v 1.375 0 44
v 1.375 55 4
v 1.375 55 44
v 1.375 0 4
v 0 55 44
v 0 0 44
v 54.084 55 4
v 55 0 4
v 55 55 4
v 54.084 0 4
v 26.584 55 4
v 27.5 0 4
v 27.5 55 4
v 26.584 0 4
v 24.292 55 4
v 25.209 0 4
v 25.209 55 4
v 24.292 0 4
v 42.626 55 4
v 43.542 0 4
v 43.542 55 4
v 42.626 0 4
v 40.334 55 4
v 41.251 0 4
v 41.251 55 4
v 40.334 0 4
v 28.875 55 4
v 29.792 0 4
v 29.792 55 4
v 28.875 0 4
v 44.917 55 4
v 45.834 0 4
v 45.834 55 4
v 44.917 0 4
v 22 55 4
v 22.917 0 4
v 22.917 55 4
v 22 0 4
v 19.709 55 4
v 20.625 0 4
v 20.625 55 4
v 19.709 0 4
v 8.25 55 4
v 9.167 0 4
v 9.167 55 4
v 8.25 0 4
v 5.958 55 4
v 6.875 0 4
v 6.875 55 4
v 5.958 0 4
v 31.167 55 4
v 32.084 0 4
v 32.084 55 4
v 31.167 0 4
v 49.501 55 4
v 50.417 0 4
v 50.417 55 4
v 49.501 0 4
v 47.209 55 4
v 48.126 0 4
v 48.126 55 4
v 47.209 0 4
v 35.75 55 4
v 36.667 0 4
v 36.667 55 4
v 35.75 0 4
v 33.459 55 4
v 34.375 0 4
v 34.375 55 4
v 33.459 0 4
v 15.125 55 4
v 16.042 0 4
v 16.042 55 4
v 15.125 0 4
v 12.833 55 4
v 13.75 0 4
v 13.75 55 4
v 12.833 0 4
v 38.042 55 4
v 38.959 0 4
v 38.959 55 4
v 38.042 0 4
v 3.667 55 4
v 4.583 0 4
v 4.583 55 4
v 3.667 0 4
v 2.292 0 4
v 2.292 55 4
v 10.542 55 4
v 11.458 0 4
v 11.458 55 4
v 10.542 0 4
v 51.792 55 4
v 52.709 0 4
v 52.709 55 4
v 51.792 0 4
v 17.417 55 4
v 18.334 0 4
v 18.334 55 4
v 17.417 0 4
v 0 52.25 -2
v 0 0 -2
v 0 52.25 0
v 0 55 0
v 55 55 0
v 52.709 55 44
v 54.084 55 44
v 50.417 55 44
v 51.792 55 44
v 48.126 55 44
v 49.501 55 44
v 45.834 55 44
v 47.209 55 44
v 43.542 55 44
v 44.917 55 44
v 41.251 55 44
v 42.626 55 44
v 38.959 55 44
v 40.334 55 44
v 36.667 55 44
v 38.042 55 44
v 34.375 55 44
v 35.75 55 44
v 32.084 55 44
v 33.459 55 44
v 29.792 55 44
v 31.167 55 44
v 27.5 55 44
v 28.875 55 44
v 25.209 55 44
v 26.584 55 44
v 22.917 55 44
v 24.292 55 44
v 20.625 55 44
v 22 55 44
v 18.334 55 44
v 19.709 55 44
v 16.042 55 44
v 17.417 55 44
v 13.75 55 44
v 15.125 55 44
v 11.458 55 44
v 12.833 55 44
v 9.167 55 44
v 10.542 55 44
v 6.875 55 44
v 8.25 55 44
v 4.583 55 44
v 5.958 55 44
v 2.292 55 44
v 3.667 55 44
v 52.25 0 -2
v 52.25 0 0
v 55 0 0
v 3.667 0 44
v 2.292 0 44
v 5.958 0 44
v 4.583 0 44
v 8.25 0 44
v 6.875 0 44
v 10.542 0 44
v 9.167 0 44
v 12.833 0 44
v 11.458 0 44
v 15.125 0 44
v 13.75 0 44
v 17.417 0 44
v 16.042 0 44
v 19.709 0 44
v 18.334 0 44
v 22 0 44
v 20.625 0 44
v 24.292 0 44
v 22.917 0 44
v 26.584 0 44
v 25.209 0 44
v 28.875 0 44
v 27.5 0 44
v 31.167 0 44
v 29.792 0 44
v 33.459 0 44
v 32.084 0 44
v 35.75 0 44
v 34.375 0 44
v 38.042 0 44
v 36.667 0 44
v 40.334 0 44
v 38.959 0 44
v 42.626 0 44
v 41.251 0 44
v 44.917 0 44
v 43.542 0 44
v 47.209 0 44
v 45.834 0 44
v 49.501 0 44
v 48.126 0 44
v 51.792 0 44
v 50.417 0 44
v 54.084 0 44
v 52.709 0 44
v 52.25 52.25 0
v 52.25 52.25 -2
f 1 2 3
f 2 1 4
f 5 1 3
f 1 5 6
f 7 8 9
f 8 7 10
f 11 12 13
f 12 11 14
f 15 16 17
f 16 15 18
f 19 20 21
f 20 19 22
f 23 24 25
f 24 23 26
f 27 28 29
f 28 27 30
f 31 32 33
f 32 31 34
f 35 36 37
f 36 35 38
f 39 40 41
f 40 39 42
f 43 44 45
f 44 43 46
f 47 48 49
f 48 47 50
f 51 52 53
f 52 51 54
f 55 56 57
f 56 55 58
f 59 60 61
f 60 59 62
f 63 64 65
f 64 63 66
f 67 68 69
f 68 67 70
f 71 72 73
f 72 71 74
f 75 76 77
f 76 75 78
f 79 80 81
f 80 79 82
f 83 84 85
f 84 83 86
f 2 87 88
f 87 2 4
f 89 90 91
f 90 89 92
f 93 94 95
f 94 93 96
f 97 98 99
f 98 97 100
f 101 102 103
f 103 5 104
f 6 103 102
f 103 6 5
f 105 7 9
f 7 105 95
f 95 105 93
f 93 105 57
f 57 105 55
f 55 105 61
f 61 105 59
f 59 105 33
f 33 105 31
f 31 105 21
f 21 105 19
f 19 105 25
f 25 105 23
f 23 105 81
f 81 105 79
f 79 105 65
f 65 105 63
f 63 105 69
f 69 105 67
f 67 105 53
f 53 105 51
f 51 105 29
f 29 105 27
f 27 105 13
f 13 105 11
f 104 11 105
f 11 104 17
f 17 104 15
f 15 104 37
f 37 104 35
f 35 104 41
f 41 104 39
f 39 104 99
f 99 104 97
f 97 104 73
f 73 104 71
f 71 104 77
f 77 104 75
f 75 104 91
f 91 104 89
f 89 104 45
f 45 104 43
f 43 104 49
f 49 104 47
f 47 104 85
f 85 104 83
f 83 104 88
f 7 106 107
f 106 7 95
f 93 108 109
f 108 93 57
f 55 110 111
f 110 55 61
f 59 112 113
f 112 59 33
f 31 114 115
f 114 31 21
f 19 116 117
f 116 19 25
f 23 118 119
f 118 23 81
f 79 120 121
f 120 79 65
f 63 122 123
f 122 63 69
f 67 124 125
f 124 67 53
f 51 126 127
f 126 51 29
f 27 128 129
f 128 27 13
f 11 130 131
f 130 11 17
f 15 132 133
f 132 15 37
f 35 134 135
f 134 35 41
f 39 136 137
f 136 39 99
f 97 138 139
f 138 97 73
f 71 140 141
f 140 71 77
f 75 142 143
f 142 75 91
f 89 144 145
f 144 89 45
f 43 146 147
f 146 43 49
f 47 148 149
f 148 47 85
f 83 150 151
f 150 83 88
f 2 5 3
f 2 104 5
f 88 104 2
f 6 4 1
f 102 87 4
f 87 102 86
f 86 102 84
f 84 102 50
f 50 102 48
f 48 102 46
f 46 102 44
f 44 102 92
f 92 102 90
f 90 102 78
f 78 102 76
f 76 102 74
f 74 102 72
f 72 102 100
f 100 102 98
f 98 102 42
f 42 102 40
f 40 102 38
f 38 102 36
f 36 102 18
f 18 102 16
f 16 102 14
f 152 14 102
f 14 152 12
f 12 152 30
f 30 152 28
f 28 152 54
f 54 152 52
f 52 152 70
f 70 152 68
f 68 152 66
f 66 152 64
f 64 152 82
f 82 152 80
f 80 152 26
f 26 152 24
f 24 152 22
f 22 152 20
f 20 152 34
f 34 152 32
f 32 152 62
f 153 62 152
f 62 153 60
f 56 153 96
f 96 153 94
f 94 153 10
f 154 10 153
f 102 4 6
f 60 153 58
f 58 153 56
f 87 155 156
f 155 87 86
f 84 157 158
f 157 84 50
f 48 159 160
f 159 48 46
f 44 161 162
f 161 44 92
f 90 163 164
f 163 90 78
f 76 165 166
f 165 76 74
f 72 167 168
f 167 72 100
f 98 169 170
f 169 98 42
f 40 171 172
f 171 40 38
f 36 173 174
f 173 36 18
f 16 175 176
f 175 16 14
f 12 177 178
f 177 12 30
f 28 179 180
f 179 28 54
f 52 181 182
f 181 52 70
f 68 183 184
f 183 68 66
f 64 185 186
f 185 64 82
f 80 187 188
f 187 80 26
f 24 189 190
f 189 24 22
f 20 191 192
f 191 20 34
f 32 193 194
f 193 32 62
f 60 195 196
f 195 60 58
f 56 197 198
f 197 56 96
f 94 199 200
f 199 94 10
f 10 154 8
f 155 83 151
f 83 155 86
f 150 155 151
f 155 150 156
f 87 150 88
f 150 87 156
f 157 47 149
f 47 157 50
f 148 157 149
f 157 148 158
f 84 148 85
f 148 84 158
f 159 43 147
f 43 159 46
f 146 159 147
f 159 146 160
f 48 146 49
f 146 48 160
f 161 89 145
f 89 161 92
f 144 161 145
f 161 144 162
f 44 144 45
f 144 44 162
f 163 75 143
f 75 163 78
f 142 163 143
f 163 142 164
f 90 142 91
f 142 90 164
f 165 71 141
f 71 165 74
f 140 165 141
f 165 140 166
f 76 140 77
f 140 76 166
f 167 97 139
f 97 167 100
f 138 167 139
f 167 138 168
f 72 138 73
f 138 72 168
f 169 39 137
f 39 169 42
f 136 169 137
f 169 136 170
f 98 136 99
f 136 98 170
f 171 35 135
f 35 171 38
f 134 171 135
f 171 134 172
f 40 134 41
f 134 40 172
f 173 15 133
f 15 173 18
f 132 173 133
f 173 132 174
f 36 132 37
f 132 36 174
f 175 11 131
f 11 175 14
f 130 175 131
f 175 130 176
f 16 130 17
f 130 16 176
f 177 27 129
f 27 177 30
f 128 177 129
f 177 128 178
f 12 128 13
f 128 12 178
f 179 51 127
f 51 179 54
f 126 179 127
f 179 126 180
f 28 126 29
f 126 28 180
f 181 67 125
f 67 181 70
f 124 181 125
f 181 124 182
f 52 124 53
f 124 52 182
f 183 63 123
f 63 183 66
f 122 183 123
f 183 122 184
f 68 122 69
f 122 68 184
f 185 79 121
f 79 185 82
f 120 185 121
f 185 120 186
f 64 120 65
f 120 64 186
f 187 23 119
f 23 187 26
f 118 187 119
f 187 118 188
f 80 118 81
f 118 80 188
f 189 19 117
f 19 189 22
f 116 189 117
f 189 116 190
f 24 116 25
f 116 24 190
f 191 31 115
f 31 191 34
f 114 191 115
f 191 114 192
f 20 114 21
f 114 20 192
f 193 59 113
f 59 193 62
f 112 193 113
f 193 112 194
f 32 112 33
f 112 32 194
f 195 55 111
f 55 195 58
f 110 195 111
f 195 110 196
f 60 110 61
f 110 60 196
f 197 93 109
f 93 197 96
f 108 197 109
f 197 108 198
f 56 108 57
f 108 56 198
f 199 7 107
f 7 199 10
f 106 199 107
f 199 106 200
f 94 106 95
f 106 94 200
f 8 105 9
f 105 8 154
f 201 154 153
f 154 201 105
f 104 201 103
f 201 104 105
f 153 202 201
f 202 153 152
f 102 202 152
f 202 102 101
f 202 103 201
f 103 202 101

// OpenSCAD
// Generated by Text-to-CAD from prompt:
// a GPU heatsink with 24 fins
$fn = 64;

module GPUHeatsink() {
cube([55, 55, 4]);
for (i = [0 : 23]) translate([2.2917*i, 0*i, 0*i]) {
    translate([0, 0, 4]) {
        cube([1.375, 55, 40]);
    }
}
    translate([0, 0, -2]) {
    cube([52.25, 52.25, 2]);
    }
    translate([15.125, 15.125, -0.8]) {
    cube([24.75, 24.75, 0.8]);
    }
}

GPUHeatsink();
